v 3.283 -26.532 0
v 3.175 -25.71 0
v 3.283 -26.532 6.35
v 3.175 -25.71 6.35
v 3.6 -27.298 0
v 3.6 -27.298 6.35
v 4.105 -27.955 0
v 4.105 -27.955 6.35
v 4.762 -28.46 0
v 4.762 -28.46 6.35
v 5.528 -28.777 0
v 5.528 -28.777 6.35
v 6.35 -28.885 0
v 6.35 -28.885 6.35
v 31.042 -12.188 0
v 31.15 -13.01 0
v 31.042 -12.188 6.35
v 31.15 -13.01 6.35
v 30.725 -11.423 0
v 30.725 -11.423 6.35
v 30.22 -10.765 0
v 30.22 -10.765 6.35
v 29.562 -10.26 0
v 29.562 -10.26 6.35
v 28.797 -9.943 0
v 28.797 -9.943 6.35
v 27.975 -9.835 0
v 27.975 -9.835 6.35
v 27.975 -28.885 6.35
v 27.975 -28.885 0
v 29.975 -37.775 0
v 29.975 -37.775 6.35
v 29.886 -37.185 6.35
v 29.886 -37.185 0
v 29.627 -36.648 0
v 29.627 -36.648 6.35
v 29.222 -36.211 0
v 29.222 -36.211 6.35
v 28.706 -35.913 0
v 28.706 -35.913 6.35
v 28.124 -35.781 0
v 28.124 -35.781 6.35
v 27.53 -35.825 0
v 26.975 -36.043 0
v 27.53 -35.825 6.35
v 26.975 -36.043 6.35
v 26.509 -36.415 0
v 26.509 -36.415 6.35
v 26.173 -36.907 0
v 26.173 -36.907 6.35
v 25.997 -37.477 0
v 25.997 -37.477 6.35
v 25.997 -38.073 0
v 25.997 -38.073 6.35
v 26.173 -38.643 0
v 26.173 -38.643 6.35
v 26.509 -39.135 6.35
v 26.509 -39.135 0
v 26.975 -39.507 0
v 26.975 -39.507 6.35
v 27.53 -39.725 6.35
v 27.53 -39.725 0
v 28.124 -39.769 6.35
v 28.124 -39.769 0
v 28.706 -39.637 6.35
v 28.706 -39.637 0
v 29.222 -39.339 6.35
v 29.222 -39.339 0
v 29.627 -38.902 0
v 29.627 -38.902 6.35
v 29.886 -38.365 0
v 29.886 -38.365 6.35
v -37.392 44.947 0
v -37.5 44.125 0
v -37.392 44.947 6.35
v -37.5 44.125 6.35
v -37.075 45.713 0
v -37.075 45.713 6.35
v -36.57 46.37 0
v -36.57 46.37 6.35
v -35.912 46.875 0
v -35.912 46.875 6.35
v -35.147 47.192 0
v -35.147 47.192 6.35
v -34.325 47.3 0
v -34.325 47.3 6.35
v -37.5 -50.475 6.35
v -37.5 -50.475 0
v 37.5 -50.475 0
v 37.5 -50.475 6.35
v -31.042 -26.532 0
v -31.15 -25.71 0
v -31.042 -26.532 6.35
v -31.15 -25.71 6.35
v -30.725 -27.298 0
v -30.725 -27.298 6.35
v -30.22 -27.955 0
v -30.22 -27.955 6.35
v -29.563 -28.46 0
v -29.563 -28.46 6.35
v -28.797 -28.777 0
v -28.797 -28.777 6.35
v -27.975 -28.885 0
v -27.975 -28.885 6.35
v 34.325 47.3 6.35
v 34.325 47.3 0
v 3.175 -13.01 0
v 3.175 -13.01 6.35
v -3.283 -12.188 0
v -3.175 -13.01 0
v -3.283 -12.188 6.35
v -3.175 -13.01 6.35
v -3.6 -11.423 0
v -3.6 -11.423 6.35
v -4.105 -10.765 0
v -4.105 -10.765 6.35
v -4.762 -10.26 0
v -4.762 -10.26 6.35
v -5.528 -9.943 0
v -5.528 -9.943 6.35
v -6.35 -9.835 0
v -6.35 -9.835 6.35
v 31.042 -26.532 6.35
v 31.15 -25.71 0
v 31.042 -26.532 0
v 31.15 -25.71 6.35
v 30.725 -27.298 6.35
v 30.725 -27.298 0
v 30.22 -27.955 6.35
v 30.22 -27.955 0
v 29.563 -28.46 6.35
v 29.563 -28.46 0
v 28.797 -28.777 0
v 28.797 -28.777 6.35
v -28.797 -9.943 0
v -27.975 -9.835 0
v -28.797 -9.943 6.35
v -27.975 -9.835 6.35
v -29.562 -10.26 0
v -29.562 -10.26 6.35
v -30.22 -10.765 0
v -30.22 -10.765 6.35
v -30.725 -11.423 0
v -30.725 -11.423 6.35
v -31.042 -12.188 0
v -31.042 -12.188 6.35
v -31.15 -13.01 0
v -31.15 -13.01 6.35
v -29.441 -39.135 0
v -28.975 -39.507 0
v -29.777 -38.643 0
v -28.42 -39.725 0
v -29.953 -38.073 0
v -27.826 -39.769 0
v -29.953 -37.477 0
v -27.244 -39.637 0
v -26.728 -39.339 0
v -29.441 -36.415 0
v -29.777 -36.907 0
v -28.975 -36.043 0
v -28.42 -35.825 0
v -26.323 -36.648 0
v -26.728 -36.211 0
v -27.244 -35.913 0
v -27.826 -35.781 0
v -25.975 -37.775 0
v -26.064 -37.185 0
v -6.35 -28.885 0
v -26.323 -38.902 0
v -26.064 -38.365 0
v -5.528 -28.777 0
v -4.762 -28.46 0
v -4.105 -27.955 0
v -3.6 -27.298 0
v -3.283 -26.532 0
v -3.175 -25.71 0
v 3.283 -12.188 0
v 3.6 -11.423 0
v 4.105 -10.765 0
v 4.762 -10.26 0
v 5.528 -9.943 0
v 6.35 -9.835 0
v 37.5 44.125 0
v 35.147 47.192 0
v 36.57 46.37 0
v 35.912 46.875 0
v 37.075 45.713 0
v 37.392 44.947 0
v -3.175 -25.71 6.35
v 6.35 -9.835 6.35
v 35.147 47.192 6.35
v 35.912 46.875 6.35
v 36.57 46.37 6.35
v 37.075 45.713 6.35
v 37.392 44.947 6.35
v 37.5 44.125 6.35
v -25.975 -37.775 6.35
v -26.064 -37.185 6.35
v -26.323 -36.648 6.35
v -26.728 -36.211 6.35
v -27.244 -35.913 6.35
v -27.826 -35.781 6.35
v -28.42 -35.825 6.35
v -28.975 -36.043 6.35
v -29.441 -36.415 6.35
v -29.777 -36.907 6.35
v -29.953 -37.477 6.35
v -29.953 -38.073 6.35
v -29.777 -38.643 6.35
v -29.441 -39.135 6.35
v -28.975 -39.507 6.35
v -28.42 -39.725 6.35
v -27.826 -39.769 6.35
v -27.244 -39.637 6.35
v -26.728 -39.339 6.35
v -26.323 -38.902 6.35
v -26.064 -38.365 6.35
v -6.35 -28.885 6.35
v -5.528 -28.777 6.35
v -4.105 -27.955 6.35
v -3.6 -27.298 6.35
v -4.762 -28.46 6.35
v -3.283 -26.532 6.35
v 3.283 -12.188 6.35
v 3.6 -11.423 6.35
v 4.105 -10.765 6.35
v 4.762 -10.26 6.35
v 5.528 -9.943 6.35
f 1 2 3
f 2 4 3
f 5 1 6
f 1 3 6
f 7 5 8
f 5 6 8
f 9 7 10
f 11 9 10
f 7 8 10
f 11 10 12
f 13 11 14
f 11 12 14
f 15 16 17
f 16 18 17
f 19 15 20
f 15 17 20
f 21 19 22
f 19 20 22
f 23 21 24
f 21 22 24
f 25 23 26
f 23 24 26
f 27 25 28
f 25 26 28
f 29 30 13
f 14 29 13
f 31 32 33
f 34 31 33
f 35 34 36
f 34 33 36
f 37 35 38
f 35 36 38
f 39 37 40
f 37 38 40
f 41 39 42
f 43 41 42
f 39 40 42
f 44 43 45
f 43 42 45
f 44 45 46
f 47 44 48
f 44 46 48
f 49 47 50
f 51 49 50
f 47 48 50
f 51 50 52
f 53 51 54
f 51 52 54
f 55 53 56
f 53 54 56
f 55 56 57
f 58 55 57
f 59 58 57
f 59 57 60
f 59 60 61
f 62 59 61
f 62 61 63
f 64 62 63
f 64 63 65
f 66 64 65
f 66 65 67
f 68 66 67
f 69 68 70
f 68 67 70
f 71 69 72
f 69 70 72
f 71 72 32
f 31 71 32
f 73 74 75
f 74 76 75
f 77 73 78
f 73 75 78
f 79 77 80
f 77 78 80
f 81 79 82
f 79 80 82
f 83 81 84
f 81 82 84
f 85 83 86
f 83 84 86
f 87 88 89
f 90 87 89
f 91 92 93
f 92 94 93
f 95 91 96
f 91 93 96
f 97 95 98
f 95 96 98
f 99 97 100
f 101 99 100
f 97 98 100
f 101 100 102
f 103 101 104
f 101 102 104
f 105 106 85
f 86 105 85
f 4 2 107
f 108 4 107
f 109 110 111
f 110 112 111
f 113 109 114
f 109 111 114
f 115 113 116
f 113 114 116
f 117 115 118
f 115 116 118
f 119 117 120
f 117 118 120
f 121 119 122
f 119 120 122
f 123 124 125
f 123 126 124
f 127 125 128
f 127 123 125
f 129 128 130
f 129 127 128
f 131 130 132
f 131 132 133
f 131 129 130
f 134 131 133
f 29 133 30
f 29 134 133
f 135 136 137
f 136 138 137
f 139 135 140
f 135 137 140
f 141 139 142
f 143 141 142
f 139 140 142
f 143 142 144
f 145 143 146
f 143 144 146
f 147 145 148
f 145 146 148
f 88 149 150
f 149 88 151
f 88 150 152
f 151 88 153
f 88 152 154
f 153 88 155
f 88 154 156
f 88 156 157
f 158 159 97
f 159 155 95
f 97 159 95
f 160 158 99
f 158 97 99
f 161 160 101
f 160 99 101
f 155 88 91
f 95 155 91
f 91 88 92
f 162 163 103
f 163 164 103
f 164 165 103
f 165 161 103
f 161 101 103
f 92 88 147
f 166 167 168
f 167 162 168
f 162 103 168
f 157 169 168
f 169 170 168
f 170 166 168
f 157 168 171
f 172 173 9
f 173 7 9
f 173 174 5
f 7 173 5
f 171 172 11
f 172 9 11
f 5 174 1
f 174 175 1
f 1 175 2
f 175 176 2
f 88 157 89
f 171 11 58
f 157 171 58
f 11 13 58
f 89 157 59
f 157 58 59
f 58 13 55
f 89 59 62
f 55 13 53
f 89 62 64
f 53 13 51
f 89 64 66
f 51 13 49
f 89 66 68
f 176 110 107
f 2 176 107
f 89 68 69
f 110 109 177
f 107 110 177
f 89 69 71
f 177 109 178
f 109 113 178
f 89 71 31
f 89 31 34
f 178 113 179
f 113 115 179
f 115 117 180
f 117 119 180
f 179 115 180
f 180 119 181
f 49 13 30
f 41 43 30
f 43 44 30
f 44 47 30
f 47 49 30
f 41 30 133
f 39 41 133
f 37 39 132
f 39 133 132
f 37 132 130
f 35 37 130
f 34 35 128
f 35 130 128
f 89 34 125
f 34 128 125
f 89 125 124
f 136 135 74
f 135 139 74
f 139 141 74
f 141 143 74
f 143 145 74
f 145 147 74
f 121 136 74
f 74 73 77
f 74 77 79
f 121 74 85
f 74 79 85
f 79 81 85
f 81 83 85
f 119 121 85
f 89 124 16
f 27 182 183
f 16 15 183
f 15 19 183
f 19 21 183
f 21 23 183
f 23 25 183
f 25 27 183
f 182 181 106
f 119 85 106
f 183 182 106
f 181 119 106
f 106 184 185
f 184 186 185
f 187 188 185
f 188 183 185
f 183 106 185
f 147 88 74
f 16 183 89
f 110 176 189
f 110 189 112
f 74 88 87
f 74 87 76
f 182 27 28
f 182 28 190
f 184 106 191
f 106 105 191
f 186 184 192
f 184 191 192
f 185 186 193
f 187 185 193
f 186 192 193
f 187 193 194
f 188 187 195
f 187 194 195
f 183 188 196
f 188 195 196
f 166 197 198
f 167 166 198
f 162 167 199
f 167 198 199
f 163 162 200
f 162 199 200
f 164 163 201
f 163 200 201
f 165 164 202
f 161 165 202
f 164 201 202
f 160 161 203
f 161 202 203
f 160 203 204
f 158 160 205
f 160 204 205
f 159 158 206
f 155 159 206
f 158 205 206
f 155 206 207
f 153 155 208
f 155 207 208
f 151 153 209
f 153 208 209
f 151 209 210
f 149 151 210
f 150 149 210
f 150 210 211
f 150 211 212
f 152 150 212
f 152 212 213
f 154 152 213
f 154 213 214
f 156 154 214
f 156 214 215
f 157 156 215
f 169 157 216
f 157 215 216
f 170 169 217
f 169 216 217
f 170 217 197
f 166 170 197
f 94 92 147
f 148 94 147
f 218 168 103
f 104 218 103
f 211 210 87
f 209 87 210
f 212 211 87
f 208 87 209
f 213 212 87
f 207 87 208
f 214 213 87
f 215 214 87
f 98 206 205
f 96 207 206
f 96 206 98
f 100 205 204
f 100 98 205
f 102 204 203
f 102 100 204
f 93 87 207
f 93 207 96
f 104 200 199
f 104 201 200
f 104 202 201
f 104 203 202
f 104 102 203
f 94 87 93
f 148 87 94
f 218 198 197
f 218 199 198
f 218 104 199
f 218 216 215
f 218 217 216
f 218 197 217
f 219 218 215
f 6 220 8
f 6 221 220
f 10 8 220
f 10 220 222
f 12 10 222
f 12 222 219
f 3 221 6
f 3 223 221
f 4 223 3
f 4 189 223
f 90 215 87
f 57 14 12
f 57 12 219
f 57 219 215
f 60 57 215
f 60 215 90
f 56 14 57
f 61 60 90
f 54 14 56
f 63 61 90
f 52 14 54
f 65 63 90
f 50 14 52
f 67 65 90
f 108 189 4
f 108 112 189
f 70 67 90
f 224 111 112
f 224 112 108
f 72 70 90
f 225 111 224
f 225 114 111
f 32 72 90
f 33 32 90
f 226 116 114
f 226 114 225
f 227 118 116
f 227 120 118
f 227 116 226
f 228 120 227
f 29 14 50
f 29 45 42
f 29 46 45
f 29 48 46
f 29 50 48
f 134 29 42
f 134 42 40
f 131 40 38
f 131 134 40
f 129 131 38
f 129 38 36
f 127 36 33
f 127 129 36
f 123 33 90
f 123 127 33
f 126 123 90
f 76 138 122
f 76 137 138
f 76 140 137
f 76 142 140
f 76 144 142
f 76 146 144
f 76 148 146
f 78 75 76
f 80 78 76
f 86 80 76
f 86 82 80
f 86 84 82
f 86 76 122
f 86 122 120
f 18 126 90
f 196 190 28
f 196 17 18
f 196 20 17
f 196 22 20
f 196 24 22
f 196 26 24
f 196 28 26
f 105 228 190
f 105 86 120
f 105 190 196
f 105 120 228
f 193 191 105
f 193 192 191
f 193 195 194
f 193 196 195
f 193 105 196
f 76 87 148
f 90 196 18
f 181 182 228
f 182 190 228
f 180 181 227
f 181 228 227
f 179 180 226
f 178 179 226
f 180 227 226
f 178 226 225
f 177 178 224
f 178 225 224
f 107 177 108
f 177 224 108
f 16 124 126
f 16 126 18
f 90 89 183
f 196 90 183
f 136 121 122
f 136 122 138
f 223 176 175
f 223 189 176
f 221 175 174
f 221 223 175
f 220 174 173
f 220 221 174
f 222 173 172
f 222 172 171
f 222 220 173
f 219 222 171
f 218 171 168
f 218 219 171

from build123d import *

# Parameters (mm, degrees)
SKETCH1_W           = 75
SKETCH1_H           = 100.95000003
BOSS_EXTRUDE1_DEPTH = 6.35
SKETCH3_R           = 2
CUT_EXTRUDE1_DEPTH  = 6.35
SKETCH4_W           = 75
SKETCH4_H           = 3.175
CUT_EXTRUDE2_DEPTH  = 64.20045986
FILLET1_R           = 3.175
SKETCH5_W           = 27.975
SKETCH5_H           = 19.05
CUT_EXTRUDE3_DEPTH  = 64.20045986
FILLET2_R           = 3.175


with BuildPart() as part:
    # Sketch1 → Boss-Extrude1 (new body)
    with BuildSketch(Plane.XY):
        Rectangle(SKETCH1_W, SKETCH1_H)
    extrude(amount=BOSS_EXTRUDE1_DEPTH)

    # Sketch3 → Cut-Extrude1 (cut)
    with BuildSketch(Plane.XY.offset(6.35)):
        with Locations((-27.975, -37.775000015)):
            Circle(SKETCH3_R)
        with Locations((27.975, -37.775000015)):
            Circle(SKETCH3_R)
    extrude(amount=-CUT_EXTRUDE1_DEPTH, mode=Mode.SUBTRACT)

    # Sketch4 → Cut-Extrude2 (cut, through all)
    with BuildSketch(Plane(origin=(0, 0, 0), x_dir=(-1, 0, 0), z_dir=(0, 0, -1))):
        with Locations((0, 48.887500015)):
            Rectangle(SKETCH4_W, SKETCH4_H)
    extrude(amount=-CUT_EXTRUDE2_DEPTH, mode=Mode.SUBTRACT)

    # Fillet1
    fillet1_edges = [part.edges().sort_by_distance(p)[0] for p in [
        (37.5, 47.300000015, 3.175),
        (-37.5, 47.300000015, 3.175),
    ]]
    fillet(fillet1_edges, radius=FILLET1_R)

    # Sketch5 → Cut-Extrude3 (cut, through all)
    with BuildSketch(Plane(origin=(0, 0, 0), x_dir=(-1, 0, 0), z_dir=(0, 0, -1))):
        with Locations((-17.1625, -19.360000015)):
            Rectangle(SKETCH5_W, SKETCH5_H)
        with Locations((17.1625, -19.360000015)):
            Rectangle(SKETCH5_W, SKETCH5_H)
    extrude(amount=-CUT_EXTRUDE3_DEPTH, mode=Mode.SUBTRACT)

    # Fillet2
    fillet2_edges = [part.edges().sort_by_distance(p)[0] for p in [
        (31.15, -28.885000015, 3.175),
        (31.15, -9.835000015, 3.175),
        (3.175, -9.835000015, 3.175),
        (3.175, -28.885000015, 3.175),
        (-3.175, -28.885000015, 3.175),
        (-3.175, -9.835000015, 3.175),
        (-31.15, -9.835000015, 3.175),
        (-31.15, -28.885000015, 3.175),
    ]]
    fillet(fillet2_edges, radius=FILLET2_R)


solid = part.part
